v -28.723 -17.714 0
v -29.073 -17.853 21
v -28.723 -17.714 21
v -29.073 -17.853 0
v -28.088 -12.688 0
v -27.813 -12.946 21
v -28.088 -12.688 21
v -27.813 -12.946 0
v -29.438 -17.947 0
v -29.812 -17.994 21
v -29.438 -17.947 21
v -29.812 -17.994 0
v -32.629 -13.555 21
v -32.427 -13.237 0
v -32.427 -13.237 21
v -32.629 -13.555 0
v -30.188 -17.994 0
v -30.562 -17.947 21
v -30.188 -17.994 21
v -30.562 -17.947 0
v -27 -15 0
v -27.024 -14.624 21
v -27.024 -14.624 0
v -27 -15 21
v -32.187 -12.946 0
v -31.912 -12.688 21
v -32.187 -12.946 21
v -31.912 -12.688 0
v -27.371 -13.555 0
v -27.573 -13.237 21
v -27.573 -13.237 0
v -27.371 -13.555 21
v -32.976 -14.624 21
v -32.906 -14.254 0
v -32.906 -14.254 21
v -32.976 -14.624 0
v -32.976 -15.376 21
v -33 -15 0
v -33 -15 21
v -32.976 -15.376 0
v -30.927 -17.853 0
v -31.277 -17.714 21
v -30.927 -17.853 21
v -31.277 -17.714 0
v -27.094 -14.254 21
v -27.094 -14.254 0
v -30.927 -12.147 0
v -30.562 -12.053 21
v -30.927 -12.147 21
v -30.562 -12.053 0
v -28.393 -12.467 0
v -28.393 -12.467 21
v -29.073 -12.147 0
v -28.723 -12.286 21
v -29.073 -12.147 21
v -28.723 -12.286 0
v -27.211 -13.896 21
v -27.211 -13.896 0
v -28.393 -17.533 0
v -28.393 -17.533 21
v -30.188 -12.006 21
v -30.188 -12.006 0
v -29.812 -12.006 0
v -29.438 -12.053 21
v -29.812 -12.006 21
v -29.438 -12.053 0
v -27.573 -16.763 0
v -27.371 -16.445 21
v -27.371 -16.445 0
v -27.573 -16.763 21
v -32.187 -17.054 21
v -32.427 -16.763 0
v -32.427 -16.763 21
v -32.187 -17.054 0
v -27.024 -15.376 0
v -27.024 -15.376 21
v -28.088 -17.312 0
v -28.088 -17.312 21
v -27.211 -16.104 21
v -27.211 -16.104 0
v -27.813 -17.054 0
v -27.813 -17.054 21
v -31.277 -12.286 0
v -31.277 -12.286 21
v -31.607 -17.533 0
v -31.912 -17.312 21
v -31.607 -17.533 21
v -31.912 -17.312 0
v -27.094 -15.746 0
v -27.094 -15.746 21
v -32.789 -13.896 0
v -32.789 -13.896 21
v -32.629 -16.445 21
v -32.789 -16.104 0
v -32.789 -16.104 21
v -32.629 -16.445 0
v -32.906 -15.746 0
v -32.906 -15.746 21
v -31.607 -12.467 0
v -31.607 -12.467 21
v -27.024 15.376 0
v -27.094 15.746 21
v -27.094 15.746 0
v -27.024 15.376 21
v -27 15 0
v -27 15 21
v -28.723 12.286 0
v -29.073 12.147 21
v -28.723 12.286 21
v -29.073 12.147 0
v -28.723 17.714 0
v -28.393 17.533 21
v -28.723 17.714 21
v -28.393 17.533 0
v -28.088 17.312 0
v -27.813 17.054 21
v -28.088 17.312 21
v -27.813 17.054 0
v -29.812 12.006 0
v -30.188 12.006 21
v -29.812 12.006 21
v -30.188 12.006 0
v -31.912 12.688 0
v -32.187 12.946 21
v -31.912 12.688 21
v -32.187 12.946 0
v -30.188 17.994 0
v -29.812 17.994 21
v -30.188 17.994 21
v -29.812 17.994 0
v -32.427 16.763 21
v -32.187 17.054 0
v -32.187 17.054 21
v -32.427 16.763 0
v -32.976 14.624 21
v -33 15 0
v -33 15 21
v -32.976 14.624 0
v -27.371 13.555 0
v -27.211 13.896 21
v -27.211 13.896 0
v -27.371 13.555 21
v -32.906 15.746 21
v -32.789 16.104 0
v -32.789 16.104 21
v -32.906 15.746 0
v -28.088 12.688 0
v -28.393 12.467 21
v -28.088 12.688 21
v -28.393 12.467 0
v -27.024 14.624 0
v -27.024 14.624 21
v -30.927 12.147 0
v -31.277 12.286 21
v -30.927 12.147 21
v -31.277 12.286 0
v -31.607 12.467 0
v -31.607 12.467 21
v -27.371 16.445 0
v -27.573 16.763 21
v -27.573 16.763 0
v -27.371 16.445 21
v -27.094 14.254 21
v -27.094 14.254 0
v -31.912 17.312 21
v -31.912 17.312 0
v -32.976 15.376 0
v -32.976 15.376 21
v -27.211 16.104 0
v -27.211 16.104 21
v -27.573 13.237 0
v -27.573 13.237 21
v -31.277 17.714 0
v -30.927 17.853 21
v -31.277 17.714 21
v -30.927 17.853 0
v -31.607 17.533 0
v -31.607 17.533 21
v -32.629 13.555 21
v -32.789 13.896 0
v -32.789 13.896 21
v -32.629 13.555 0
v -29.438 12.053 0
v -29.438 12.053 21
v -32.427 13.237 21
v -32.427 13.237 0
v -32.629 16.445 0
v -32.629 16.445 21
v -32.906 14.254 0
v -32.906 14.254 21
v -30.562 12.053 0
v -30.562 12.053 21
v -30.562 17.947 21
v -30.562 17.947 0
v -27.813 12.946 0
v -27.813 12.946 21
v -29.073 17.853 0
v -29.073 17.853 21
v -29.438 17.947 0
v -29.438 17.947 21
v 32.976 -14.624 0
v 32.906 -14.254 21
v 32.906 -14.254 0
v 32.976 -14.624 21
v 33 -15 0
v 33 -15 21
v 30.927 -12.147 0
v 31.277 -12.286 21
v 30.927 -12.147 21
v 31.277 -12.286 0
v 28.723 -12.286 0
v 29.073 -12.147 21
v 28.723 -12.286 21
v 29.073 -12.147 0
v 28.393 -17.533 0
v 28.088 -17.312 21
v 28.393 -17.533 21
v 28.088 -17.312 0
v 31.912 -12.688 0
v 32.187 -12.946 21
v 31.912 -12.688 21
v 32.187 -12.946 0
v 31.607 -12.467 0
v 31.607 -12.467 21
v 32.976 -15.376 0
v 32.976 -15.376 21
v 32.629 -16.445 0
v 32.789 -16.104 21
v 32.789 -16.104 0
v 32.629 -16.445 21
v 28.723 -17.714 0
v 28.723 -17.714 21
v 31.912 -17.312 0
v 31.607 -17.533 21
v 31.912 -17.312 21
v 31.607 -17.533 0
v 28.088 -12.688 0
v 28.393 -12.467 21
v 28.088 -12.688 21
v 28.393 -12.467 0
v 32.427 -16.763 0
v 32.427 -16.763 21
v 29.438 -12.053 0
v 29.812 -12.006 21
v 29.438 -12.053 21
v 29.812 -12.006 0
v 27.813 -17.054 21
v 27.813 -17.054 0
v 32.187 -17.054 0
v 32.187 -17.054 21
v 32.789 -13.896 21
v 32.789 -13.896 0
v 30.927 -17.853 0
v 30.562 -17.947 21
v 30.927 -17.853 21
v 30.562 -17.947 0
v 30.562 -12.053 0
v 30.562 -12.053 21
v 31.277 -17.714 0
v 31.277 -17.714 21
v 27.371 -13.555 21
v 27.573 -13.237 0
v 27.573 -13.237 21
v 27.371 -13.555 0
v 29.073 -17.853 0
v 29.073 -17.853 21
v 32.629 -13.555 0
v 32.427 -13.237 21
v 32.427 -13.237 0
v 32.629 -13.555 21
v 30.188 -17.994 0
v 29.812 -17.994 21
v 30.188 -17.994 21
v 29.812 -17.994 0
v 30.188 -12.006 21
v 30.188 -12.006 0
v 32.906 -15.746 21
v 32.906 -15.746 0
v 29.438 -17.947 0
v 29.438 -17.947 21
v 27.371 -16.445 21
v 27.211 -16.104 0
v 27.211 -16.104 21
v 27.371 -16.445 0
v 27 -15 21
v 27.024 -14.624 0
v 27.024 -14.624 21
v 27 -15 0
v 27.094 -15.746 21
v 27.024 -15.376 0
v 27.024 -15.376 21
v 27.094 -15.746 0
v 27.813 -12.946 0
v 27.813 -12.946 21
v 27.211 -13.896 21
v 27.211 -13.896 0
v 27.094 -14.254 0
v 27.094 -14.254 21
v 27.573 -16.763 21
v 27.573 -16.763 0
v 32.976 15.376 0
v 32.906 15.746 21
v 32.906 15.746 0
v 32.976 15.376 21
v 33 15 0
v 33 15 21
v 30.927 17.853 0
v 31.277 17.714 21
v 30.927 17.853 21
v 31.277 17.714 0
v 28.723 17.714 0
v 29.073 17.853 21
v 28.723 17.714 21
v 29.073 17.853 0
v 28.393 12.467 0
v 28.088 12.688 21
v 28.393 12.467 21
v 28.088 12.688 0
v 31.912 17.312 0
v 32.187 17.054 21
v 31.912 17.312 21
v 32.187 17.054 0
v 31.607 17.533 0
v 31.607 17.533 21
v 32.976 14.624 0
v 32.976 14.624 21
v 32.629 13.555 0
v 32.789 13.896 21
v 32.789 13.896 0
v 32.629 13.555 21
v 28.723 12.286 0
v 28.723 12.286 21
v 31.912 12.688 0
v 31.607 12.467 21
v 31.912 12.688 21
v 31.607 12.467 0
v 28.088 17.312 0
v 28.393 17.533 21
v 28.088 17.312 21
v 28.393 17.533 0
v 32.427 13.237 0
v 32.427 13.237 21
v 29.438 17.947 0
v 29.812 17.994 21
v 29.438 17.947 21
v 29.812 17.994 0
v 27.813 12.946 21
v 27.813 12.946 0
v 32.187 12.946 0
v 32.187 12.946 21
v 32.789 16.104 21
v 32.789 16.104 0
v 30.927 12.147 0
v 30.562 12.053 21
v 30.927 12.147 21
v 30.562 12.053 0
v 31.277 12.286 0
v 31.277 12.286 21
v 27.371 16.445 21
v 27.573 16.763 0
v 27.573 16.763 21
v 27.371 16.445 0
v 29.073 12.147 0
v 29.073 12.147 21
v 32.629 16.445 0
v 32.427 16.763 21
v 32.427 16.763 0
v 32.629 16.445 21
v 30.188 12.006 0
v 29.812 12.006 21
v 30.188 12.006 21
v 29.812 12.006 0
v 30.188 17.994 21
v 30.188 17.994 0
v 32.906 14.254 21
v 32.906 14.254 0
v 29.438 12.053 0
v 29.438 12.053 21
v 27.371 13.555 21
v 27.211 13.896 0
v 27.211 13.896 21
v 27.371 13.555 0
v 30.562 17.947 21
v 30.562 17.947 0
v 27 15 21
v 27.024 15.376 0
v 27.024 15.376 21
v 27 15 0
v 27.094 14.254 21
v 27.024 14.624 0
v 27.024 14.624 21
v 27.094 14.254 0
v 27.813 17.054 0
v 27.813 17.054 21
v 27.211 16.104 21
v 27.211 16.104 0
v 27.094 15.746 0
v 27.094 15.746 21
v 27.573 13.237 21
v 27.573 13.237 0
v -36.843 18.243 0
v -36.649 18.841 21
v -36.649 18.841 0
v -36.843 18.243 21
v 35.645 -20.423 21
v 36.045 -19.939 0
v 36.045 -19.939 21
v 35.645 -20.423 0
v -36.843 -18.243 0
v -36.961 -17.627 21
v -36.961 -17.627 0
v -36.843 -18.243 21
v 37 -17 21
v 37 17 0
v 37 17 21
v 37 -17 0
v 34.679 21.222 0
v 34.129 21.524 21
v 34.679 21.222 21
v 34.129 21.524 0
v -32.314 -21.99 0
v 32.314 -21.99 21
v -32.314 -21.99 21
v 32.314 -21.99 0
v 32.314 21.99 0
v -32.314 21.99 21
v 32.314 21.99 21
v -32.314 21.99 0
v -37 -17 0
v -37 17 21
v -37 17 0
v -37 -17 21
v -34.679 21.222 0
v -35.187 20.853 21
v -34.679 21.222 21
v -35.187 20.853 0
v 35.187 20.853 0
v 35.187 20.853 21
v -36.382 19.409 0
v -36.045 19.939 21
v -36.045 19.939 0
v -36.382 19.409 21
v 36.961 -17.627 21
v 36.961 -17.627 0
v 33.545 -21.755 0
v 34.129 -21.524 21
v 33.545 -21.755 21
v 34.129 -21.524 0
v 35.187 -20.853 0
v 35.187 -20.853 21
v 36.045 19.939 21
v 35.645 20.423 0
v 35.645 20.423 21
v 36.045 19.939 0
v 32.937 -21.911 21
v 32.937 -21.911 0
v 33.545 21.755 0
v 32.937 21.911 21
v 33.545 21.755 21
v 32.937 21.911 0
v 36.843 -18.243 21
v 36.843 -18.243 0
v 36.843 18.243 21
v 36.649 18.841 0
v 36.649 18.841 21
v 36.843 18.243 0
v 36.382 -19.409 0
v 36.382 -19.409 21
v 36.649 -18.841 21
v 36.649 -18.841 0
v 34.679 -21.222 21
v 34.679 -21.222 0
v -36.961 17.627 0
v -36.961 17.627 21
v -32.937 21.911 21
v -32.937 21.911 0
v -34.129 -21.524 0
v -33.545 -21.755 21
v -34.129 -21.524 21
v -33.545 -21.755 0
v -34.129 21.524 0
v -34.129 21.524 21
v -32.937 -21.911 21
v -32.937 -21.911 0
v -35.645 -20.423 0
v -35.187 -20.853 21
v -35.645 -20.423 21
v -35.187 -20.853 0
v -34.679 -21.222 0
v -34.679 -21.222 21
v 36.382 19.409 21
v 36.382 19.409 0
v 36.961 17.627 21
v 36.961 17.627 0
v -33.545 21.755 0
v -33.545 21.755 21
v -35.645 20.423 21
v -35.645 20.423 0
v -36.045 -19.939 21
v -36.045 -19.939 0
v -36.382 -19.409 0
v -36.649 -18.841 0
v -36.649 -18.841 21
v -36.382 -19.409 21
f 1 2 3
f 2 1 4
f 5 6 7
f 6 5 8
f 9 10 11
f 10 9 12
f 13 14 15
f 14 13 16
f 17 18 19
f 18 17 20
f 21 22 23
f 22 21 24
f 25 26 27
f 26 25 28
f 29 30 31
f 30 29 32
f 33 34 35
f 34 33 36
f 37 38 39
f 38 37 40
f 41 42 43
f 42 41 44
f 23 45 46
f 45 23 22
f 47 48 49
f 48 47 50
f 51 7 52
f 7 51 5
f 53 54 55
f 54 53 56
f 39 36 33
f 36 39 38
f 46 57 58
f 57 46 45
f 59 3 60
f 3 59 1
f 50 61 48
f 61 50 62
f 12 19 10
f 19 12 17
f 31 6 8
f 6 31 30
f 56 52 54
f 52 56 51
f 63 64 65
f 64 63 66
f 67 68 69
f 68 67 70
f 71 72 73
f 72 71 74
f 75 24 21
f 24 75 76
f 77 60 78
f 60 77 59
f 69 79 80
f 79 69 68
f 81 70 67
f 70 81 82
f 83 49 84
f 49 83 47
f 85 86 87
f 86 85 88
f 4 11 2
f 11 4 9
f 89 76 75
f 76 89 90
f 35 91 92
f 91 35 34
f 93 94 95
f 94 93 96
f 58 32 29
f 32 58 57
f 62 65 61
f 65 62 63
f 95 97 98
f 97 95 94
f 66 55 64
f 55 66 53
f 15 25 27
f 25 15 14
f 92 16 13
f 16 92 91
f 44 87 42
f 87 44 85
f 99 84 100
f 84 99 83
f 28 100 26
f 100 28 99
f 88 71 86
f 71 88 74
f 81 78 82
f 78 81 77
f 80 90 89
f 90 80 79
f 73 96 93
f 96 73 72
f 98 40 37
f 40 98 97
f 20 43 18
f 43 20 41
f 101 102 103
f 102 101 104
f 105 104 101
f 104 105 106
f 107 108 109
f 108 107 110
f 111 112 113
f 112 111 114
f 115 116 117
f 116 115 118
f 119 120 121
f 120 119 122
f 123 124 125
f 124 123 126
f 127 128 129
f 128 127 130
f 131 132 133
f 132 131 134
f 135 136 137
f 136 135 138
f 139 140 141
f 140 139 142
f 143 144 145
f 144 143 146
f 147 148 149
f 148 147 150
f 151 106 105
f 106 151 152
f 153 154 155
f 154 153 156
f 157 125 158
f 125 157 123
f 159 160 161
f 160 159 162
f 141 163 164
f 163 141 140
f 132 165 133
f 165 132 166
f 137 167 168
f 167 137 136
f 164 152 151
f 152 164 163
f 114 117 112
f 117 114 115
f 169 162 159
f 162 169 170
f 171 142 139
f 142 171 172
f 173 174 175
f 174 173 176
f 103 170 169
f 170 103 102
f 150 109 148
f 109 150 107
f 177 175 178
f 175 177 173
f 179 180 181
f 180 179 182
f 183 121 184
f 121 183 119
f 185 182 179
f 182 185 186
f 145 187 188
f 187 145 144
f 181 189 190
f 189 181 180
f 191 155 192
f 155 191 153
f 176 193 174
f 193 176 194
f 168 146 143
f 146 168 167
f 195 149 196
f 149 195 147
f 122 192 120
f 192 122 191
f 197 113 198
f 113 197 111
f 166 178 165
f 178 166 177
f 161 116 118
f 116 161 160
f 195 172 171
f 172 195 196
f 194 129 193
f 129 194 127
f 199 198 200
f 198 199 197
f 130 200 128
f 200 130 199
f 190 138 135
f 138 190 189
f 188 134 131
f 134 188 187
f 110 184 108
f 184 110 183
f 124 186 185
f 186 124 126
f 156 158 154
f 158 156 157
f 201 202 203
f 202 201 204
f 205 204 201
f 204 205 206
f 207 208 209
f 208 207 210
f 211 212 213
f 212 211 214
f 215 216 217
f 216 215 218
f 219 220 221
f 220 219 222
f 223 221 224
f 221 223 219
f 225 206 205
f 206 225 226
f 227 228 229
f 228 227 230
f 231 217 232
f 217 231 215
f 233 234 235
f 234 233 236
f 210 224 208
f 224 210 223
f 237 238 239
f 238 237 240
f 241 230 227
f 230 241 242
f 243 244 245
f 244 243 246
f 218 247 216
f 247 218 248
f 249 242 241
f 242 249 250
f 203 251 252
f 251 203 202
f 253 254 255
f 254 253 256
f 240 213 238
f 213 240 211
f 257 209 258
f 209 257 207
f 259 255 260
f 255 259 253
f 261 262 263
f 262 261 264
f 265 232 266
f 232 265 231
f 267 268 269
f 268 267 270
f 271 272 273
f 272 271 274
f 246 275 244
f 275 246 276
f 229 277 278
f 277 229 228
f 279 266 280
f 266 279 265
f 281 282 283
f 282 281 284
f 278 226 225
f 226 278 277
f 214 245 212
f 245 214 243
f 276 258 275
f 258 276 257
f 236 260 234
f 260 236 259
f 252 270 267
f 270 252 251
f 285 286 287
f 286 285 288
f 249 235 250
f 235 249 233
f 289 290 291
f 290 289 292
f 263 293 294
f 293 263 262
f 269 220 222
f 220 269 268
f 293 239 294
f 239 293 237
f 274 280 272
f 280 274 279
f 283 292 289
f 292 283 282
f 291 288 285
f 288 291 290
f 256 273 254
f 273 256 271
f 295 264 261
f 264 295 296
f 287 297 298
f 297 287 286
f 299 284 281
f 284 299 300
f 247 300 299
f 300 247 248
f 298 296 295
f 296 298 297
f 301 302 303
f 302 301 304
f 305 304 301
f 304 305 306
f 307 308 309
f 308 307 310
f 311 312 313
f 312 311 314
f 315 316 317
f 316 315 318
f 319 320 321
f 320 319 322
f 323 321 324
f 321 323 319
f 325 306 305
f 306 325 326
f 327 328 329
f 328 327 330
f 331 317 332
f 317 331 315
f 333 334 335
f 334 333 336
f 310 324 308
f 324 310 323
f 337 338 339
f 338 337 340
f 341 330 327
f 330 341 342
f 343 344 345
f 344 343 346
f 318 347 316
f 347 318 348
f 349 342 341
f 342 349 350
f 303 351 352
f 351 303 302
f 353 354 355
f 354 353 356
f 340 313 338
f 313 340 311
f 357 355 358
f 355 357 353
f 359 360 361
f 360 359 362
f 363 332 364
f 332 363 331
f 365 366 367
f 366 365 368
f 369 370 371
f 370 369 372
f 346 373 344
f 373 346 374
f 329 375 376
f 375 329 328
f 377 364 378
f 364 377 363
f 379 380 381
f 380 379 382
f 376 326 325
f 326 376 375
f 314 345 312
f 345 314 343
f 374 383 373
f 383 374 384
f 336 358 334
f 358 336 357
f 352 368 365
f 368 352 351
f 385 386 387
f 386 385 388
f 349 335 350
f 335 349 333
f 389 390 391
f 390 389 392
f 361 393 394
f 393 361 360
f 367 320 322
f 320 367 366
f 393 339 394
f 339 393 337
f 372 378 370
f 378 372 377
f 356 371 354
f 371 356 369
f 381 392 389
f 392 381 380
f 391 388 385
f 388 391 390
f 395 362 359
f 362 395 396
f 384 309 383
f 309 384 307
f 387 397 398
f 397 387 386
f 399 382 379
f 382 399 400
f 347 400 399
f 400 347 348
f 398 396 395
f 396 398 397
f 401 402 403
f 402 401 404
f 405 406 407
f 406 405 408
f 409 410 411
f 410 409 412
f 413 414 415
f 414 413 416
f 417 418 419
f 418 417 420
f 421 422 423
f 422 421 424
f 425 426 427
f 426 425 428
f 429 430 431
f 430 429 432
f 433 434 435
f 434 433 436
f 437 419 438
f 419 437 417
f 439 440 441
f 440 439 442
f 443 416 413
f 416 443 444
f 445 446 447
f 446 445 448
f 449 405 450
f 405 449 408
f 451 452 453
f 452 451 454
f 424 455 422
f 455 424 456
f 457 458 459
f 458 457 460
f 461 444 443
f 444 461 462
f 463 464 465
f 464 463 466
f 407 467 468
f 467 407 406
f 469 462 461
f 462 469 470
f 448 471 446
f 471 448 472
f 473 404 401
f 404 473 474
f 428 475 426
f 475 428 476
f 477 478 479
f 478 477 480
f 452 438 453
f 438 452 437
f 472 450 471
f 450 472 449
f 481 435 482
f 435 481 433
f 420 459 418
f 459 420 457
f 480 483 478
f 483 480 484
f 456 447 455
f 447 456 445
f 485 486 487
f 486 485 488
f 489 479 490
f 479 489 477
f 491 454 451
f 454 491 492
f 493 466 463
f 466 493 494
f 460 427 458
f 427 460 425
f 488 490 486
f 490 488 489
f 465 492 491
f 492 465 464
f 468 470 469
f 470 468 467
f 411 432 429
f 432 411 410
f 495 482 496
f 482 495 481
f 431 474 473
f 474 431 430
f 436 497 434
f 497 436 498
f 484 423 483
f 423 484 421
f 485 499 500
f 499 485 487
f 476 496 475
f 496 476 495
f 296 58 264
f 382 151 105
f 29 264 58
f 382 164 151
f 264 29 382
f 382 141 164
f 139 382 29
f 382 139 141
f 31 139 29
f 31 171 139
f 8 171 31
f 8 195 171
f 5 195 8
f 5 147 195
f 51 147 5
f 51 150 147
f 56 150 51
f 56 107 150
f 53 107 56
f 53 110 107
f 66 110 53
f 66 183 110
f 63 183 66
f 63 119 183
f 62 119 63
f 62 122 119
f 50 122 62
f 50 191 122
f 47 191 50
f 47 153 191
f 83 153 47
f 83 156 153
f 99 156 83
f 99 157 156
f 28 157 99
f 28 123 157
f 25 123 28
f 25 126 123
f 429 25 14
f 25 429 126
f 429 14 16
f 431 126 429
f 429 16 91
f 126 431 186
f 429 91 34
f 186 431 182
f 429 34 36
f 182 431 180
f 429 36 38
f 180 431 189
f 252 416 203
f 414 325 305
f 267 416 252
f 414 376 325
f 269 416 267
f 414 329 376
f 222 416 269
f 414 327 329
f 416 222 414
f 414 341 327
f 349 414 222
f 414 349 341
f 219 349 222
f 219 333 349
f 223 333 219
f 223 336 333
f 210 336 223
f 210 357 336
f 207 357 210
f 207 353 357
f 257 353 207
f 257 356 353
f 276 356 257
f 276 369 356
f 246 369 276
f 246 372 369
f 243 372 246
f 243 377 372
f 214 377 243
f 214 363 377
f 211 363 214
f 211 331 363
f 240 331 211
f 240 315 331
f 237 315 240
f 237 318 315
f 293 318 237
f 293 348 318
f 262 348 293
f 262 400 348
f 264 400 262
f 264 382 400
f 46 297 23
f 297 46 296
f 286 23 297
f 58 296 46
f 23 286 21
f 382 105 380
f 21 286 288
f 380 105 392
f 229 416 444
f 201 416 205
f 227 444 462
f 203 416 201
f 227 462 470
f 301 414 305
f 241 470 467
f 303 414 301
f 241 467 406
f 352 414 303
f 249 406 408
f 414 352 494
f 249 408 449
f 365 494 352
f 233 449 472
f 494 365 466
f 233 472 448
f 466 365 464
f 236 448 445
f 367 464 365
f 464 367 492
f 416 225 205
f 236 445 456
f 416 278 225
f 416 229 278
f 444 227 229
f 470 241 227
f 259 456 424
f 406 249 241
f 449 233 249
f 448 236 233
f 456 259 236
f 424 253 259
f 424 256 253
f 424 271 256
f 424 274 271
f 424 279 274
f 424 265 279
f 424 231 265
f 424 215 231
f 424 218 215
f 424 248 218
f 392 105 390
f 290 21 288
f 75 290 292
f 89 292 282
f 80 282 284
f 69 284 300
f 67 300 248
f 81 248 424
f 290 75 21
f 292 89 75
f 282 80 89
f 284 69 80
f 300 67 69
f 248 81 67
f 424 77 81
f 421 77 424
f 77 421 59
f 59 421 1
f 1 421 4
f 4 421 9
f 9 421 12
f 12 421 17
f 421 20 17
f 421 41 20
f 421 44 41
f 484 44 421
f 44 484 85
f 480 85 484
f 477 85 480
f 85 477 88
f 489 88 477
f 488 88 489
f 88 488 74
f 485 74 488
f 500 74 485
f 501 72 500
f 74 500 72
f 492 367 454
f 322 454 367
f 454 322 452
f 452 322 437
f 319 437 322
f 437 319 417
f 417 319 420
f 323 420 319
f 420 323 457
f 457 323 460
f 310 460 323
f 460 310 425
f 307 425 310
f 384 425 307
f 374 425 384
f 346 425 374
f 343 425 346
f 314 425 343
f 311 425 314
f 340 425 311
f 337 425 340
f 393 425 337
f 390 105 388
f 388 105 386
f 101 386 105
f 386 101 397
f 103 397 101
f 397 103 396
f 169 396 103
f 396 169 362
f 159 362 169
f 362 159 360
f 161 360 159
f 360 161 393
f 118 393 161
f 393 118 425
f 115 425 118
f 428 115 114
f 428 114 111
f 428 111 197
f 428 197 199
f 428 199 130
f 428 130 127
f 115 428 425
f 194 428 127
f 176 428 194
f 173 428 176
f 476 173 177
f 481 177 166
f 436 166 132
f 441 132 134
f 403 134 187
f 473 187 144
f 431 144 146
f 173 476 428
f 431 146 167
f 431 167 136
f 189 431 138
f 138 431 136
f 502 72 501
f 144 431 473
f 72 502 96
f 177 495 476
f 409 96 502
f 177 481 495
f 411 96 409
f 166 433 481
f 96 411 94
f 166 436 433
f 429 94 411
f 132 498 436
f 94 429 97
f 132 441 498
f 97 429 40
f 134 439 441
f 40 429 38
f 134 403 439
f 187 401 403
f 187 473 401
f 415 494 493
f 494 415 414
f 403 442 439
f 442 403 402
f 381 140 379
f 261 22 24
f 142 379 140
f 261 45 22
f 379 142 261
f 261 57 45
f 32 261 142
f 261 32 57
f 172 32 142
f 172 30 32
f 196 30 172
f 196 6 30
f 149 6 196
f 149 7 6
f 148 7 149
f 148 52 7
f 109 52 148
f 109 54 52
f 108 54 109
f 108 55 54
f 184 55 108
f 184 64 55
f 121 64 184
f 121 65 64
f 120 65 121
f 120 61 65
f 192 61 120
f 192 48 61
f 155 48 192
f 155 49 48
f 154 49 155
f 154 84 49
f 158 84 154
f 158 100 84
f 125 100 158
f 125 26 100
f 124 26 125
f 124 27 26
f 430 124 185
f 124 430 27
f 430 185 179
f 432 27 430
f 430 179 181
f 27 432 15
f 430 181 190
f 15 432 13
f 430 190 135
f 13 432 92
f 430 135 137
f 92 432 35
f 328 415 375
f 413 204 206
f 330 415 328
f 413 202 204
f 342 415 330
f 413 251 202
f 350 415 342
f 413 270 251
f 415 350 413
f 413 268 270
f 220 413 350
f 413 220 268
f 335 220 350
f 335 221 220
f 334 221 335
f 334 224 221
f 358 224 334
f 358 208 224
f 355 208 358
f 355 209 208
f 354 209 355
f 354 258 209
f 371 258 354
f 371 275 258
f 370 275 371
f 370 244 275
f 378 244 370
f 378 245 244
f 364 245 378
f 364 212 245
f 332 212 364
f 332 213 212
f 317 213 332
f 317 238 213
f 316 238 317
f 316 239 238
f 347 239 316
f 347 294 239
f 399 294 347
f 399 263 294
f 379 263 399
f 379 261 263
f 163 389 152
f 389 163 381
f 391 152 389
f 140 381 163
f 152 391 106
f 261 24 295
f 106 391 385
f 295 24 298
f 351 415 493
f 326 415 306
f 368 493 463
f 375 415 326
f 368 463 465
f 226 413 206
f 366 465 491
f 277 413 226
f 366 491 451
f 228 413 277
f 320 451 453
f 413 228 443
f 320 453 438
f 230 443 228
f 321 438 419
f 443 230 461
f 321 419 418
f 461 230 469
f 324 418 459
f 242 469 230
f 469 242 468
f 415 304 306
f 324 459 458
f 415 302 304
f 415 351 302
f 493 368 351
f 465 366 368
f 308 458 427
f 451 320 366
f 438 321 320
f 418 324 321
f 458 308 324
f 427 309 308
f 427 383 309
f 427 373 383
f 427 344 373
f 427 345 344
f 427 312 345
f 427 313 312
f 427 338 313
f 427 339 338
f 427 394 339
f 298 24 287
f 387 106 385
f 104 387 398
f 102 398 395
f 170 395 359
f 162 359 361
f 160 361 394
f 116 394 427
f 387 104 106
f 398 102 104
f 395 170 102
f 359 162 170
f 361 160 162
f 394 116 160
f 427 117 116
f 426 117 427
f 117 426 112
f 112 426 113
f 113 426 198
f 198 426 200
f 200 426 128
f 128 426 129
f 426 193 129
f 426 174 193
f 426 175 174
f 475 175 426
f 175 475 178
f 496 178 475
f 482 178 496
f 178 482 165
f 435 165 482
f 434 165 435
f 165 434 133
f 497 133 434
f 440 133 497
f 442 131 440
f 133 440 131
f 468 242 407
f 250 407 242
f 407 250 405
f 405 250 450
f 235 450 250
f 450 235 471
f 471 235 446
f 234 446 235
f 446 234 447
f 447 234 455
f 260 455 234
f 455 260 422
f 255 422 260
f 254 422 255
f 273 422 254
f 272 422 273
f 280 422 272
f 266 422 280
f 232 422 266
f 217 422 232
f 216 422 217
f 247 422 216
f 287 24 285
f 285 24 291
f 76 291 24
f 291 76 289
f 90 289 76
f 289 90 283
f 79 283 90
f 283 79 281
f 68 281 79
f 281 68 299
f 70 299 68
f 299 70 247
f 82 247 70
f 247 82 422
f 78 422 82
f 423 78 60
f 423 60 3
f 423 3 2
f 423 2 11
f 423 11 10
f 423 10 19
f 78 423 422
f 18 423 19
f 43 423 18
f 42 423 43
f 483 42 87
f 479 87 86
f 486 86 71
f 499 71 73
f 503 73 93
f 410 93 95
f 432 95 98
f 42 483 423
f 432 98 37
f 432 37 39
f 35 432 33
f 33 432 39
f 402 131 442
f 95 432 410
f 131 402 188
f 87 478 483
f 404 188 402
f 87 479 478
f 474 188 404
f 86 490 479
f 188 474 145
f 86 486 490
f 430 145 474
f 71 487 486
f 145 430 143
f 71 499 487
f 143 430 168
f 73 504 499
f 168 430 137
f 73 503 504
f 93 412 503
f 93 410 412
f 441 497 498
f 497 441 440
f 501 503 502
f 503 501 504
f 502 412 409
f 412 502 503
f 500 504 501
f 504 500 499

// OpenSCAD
$fn = 50;


difference() {
	union() {
		hull() {
			translate(v = [-32.0000000000, 17.0000000000, 0]) {
				cylinder(h = 21, r = 5);
			}
			translate(v = [32.0000000000, 17.0000000000, 0]) {
				cylinder(h = 21, r = 5);
			}
			translate(v = [-32.0000000000, -17.0000000000, 0]) {
				cylinder(h = 21, r = 5);
			}
			translate(v = [32.0000000000, -17.0000000000, 0]) {
				cylinder(h = 21, r = 5);
			}
		}
	}
	union() {
		translate(v = [-30.0000000000, -15.0000000000, -100.0000000000]) {
			cylinder(h = 200, r = 3.0000000000);
		}
		translate(v = [-30.0000000000, 15.0000000000, -100.0000000000]) {
			cylinder(h = 200, r = 3.0000000000);
		}
		translate(v = [30.0000000000, -15.0000000000, -100.0000000000]) {
			cylinder(h = 200, r = 3.0000000000);
		}
		translate(v = [30.0000000000, 15.0000000000, -100.0000000000]) {
			cylinder(h = 200, r = 3.0000000000);
		}
	}
}
